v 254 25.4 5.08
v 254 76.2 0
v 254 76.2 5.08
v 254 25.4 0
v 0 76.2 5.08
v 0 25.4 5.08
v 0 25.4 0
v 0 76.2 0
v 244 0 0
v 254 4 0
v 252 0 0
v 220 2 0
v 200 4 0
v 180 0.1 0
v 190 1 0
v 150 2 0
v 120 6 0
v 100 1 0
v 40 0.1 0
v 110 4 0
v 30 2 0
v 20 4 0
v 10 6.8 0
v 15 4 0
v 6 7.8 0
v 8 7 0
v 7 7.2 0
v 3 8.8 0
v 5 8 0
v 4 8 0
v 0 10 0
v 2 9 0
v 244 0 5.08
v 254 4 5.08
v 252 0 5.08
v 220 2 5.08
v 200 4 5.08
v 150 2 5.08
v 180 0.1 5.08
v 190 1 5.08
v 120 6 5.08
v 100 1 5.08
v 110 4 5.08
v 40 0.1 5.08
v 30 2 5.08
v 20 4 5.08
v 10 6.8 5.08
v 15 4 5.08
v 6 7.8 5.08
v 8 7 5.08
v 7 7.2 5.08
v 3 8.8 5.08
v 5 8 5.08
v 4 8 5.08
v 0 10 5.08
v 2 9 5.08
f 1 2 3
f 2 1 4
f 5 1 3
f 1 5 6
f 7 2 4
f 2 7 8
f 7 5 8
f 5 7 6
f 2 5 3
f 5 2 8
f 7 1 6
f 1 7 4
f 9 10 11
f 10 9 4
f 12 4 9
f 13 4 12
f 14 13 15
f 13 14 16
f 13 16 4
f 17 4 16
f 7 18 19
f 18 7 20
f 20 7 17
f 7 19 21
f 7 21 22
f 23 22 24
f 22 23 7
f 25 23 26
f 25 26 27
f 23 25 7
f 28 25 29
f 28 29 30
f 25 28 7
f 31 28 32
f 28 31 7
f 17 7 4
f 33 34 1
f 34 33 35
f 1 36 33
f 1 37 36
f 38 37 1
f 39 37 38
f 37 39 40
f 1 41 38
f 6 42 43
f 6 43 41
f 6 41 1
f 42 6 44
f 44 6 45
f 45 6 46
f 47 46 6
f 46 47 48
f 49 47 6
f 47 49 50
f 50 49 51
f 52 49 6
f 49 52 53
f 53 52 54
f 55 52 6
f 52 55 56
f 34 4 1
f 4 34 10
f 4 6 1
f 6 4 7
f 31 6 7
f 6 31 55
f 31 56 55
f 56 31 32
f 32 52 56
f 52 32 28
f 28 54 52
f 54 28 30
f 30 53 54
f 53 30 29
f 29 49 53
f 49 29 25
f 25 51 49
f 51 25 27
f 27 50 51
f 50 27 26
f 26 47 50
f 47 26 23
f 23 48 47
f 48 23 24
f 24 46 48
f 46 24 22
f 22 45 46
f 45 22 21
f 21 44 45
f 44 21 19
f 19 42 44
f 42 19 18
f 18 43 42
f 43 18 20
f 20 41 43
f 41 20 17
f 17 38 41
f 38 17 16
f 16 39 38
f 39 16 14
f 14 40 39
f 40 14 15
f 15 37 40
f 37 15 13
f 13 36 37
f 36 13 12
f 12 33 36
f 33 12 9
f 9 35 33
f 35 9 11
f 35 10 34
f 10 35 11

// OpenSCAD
// file: common/board.scad
// board.scad

BOARD_DEFAULT_LENGTH = 600;
BOARD_DEFAULT_WIDTH = 120;
BOARD_DEFAULT_THICKNESS = 120;

function board_get_default_size()
    = [BOARD_DEFAULT_LENGTH, BOARD_DEFAULT_WIDTH, BOARD_DEFAULT_THICKNESS];

module board(size = board_get_default_size(), center = false)
{
    // size[0] is always with the grain
    // size[1] is against the grain
    // size[2] is the board thickness
    cube(size = size, center = center);
}
// file: common/common_functions.scad
// common_functions.scad

function get_visual_overrun() = 0.1;

function ft_to_cm(ft) = ft * 30.48;

function cm_to_ft(cm) = cm / 30.48;

function in_to_cm(in) = in * 2.54;

function cm_to_in(cm) = cm / 2.54;
// main file
// slab.scad
// units: centimeter

use <common/common_functions.scad>
use <common/board.scad>

SLAB_LENGTH = in_to_cm(100.0);
SLAB_WIDTH = in_to_cm(30.0);
SLAB_THICKNESS = in_to_cm(2.0);

SLAB_RIGHT_BOARD_WIDTH = in_to_cm(10.0);
SLAB_LEFT_EDGE_WIDTH = in_to_cm(10.0);

RIGHT_EDGE_POINTS = [
        [0, SLAB_RIGHT_BOARD_WIDTH],
        [0, 10],
        [1, 9.5],
        [2, 9],
        [3, 8.8],
        [4, 8],
        [5, 8],
        [6, 7.8],
        [7, 7.2],
        [8, 7],
        [9, 6.9],
        [10, 6.8],
        [15, 4],
        [20, 4],
        [30, 2],
        [40, 0.1],
        [100, 1],
        [110, 4],
        [120, 6],
        [150, 2],
        [180, 0.1],
        [190, 1],
        [200, 4],
        [220, 2],
        [SLAB_LENGTH - 10, 0],
        [SLAB_LENGTH - 5, 0],
        [SLAB_LENGTH - 2, 0],
        [SLAB_LENGTH, 4],
        [SLAB_LENGTH, SLAB_RIGHT_BOARD_WIDTH]];

module slab_right_edge()
{
    linear_extrude(
            height = SLAB_THICKNESS,
            center = false,
            convexity = 0,
            twist = 0)
    {
        bounds = [0 : 1 : len(RIGHT_EDGE_POINTS) - 1];

        polygon([for(a = bounds) [RIGHT_EDGE_POINTS[a][0],  RIGHT_EDGE_POINTS[a][1]]]);
    }
}

module slab_left_edge()
{
    board_size = [
            SLAB_LENGTH,
            SLAB_WIDTH - SLAB_RIGHT_BOARD_WIDTH,
            SLAB_THICKNESS];

    board(board_size);
}

module slab()
{
    translate([0, SLAB_RIGHT_BOARD_WIDTH, 0])
        slab_left_edge();

    slab_right_edge();
}

color("Sienna")
    slab();
